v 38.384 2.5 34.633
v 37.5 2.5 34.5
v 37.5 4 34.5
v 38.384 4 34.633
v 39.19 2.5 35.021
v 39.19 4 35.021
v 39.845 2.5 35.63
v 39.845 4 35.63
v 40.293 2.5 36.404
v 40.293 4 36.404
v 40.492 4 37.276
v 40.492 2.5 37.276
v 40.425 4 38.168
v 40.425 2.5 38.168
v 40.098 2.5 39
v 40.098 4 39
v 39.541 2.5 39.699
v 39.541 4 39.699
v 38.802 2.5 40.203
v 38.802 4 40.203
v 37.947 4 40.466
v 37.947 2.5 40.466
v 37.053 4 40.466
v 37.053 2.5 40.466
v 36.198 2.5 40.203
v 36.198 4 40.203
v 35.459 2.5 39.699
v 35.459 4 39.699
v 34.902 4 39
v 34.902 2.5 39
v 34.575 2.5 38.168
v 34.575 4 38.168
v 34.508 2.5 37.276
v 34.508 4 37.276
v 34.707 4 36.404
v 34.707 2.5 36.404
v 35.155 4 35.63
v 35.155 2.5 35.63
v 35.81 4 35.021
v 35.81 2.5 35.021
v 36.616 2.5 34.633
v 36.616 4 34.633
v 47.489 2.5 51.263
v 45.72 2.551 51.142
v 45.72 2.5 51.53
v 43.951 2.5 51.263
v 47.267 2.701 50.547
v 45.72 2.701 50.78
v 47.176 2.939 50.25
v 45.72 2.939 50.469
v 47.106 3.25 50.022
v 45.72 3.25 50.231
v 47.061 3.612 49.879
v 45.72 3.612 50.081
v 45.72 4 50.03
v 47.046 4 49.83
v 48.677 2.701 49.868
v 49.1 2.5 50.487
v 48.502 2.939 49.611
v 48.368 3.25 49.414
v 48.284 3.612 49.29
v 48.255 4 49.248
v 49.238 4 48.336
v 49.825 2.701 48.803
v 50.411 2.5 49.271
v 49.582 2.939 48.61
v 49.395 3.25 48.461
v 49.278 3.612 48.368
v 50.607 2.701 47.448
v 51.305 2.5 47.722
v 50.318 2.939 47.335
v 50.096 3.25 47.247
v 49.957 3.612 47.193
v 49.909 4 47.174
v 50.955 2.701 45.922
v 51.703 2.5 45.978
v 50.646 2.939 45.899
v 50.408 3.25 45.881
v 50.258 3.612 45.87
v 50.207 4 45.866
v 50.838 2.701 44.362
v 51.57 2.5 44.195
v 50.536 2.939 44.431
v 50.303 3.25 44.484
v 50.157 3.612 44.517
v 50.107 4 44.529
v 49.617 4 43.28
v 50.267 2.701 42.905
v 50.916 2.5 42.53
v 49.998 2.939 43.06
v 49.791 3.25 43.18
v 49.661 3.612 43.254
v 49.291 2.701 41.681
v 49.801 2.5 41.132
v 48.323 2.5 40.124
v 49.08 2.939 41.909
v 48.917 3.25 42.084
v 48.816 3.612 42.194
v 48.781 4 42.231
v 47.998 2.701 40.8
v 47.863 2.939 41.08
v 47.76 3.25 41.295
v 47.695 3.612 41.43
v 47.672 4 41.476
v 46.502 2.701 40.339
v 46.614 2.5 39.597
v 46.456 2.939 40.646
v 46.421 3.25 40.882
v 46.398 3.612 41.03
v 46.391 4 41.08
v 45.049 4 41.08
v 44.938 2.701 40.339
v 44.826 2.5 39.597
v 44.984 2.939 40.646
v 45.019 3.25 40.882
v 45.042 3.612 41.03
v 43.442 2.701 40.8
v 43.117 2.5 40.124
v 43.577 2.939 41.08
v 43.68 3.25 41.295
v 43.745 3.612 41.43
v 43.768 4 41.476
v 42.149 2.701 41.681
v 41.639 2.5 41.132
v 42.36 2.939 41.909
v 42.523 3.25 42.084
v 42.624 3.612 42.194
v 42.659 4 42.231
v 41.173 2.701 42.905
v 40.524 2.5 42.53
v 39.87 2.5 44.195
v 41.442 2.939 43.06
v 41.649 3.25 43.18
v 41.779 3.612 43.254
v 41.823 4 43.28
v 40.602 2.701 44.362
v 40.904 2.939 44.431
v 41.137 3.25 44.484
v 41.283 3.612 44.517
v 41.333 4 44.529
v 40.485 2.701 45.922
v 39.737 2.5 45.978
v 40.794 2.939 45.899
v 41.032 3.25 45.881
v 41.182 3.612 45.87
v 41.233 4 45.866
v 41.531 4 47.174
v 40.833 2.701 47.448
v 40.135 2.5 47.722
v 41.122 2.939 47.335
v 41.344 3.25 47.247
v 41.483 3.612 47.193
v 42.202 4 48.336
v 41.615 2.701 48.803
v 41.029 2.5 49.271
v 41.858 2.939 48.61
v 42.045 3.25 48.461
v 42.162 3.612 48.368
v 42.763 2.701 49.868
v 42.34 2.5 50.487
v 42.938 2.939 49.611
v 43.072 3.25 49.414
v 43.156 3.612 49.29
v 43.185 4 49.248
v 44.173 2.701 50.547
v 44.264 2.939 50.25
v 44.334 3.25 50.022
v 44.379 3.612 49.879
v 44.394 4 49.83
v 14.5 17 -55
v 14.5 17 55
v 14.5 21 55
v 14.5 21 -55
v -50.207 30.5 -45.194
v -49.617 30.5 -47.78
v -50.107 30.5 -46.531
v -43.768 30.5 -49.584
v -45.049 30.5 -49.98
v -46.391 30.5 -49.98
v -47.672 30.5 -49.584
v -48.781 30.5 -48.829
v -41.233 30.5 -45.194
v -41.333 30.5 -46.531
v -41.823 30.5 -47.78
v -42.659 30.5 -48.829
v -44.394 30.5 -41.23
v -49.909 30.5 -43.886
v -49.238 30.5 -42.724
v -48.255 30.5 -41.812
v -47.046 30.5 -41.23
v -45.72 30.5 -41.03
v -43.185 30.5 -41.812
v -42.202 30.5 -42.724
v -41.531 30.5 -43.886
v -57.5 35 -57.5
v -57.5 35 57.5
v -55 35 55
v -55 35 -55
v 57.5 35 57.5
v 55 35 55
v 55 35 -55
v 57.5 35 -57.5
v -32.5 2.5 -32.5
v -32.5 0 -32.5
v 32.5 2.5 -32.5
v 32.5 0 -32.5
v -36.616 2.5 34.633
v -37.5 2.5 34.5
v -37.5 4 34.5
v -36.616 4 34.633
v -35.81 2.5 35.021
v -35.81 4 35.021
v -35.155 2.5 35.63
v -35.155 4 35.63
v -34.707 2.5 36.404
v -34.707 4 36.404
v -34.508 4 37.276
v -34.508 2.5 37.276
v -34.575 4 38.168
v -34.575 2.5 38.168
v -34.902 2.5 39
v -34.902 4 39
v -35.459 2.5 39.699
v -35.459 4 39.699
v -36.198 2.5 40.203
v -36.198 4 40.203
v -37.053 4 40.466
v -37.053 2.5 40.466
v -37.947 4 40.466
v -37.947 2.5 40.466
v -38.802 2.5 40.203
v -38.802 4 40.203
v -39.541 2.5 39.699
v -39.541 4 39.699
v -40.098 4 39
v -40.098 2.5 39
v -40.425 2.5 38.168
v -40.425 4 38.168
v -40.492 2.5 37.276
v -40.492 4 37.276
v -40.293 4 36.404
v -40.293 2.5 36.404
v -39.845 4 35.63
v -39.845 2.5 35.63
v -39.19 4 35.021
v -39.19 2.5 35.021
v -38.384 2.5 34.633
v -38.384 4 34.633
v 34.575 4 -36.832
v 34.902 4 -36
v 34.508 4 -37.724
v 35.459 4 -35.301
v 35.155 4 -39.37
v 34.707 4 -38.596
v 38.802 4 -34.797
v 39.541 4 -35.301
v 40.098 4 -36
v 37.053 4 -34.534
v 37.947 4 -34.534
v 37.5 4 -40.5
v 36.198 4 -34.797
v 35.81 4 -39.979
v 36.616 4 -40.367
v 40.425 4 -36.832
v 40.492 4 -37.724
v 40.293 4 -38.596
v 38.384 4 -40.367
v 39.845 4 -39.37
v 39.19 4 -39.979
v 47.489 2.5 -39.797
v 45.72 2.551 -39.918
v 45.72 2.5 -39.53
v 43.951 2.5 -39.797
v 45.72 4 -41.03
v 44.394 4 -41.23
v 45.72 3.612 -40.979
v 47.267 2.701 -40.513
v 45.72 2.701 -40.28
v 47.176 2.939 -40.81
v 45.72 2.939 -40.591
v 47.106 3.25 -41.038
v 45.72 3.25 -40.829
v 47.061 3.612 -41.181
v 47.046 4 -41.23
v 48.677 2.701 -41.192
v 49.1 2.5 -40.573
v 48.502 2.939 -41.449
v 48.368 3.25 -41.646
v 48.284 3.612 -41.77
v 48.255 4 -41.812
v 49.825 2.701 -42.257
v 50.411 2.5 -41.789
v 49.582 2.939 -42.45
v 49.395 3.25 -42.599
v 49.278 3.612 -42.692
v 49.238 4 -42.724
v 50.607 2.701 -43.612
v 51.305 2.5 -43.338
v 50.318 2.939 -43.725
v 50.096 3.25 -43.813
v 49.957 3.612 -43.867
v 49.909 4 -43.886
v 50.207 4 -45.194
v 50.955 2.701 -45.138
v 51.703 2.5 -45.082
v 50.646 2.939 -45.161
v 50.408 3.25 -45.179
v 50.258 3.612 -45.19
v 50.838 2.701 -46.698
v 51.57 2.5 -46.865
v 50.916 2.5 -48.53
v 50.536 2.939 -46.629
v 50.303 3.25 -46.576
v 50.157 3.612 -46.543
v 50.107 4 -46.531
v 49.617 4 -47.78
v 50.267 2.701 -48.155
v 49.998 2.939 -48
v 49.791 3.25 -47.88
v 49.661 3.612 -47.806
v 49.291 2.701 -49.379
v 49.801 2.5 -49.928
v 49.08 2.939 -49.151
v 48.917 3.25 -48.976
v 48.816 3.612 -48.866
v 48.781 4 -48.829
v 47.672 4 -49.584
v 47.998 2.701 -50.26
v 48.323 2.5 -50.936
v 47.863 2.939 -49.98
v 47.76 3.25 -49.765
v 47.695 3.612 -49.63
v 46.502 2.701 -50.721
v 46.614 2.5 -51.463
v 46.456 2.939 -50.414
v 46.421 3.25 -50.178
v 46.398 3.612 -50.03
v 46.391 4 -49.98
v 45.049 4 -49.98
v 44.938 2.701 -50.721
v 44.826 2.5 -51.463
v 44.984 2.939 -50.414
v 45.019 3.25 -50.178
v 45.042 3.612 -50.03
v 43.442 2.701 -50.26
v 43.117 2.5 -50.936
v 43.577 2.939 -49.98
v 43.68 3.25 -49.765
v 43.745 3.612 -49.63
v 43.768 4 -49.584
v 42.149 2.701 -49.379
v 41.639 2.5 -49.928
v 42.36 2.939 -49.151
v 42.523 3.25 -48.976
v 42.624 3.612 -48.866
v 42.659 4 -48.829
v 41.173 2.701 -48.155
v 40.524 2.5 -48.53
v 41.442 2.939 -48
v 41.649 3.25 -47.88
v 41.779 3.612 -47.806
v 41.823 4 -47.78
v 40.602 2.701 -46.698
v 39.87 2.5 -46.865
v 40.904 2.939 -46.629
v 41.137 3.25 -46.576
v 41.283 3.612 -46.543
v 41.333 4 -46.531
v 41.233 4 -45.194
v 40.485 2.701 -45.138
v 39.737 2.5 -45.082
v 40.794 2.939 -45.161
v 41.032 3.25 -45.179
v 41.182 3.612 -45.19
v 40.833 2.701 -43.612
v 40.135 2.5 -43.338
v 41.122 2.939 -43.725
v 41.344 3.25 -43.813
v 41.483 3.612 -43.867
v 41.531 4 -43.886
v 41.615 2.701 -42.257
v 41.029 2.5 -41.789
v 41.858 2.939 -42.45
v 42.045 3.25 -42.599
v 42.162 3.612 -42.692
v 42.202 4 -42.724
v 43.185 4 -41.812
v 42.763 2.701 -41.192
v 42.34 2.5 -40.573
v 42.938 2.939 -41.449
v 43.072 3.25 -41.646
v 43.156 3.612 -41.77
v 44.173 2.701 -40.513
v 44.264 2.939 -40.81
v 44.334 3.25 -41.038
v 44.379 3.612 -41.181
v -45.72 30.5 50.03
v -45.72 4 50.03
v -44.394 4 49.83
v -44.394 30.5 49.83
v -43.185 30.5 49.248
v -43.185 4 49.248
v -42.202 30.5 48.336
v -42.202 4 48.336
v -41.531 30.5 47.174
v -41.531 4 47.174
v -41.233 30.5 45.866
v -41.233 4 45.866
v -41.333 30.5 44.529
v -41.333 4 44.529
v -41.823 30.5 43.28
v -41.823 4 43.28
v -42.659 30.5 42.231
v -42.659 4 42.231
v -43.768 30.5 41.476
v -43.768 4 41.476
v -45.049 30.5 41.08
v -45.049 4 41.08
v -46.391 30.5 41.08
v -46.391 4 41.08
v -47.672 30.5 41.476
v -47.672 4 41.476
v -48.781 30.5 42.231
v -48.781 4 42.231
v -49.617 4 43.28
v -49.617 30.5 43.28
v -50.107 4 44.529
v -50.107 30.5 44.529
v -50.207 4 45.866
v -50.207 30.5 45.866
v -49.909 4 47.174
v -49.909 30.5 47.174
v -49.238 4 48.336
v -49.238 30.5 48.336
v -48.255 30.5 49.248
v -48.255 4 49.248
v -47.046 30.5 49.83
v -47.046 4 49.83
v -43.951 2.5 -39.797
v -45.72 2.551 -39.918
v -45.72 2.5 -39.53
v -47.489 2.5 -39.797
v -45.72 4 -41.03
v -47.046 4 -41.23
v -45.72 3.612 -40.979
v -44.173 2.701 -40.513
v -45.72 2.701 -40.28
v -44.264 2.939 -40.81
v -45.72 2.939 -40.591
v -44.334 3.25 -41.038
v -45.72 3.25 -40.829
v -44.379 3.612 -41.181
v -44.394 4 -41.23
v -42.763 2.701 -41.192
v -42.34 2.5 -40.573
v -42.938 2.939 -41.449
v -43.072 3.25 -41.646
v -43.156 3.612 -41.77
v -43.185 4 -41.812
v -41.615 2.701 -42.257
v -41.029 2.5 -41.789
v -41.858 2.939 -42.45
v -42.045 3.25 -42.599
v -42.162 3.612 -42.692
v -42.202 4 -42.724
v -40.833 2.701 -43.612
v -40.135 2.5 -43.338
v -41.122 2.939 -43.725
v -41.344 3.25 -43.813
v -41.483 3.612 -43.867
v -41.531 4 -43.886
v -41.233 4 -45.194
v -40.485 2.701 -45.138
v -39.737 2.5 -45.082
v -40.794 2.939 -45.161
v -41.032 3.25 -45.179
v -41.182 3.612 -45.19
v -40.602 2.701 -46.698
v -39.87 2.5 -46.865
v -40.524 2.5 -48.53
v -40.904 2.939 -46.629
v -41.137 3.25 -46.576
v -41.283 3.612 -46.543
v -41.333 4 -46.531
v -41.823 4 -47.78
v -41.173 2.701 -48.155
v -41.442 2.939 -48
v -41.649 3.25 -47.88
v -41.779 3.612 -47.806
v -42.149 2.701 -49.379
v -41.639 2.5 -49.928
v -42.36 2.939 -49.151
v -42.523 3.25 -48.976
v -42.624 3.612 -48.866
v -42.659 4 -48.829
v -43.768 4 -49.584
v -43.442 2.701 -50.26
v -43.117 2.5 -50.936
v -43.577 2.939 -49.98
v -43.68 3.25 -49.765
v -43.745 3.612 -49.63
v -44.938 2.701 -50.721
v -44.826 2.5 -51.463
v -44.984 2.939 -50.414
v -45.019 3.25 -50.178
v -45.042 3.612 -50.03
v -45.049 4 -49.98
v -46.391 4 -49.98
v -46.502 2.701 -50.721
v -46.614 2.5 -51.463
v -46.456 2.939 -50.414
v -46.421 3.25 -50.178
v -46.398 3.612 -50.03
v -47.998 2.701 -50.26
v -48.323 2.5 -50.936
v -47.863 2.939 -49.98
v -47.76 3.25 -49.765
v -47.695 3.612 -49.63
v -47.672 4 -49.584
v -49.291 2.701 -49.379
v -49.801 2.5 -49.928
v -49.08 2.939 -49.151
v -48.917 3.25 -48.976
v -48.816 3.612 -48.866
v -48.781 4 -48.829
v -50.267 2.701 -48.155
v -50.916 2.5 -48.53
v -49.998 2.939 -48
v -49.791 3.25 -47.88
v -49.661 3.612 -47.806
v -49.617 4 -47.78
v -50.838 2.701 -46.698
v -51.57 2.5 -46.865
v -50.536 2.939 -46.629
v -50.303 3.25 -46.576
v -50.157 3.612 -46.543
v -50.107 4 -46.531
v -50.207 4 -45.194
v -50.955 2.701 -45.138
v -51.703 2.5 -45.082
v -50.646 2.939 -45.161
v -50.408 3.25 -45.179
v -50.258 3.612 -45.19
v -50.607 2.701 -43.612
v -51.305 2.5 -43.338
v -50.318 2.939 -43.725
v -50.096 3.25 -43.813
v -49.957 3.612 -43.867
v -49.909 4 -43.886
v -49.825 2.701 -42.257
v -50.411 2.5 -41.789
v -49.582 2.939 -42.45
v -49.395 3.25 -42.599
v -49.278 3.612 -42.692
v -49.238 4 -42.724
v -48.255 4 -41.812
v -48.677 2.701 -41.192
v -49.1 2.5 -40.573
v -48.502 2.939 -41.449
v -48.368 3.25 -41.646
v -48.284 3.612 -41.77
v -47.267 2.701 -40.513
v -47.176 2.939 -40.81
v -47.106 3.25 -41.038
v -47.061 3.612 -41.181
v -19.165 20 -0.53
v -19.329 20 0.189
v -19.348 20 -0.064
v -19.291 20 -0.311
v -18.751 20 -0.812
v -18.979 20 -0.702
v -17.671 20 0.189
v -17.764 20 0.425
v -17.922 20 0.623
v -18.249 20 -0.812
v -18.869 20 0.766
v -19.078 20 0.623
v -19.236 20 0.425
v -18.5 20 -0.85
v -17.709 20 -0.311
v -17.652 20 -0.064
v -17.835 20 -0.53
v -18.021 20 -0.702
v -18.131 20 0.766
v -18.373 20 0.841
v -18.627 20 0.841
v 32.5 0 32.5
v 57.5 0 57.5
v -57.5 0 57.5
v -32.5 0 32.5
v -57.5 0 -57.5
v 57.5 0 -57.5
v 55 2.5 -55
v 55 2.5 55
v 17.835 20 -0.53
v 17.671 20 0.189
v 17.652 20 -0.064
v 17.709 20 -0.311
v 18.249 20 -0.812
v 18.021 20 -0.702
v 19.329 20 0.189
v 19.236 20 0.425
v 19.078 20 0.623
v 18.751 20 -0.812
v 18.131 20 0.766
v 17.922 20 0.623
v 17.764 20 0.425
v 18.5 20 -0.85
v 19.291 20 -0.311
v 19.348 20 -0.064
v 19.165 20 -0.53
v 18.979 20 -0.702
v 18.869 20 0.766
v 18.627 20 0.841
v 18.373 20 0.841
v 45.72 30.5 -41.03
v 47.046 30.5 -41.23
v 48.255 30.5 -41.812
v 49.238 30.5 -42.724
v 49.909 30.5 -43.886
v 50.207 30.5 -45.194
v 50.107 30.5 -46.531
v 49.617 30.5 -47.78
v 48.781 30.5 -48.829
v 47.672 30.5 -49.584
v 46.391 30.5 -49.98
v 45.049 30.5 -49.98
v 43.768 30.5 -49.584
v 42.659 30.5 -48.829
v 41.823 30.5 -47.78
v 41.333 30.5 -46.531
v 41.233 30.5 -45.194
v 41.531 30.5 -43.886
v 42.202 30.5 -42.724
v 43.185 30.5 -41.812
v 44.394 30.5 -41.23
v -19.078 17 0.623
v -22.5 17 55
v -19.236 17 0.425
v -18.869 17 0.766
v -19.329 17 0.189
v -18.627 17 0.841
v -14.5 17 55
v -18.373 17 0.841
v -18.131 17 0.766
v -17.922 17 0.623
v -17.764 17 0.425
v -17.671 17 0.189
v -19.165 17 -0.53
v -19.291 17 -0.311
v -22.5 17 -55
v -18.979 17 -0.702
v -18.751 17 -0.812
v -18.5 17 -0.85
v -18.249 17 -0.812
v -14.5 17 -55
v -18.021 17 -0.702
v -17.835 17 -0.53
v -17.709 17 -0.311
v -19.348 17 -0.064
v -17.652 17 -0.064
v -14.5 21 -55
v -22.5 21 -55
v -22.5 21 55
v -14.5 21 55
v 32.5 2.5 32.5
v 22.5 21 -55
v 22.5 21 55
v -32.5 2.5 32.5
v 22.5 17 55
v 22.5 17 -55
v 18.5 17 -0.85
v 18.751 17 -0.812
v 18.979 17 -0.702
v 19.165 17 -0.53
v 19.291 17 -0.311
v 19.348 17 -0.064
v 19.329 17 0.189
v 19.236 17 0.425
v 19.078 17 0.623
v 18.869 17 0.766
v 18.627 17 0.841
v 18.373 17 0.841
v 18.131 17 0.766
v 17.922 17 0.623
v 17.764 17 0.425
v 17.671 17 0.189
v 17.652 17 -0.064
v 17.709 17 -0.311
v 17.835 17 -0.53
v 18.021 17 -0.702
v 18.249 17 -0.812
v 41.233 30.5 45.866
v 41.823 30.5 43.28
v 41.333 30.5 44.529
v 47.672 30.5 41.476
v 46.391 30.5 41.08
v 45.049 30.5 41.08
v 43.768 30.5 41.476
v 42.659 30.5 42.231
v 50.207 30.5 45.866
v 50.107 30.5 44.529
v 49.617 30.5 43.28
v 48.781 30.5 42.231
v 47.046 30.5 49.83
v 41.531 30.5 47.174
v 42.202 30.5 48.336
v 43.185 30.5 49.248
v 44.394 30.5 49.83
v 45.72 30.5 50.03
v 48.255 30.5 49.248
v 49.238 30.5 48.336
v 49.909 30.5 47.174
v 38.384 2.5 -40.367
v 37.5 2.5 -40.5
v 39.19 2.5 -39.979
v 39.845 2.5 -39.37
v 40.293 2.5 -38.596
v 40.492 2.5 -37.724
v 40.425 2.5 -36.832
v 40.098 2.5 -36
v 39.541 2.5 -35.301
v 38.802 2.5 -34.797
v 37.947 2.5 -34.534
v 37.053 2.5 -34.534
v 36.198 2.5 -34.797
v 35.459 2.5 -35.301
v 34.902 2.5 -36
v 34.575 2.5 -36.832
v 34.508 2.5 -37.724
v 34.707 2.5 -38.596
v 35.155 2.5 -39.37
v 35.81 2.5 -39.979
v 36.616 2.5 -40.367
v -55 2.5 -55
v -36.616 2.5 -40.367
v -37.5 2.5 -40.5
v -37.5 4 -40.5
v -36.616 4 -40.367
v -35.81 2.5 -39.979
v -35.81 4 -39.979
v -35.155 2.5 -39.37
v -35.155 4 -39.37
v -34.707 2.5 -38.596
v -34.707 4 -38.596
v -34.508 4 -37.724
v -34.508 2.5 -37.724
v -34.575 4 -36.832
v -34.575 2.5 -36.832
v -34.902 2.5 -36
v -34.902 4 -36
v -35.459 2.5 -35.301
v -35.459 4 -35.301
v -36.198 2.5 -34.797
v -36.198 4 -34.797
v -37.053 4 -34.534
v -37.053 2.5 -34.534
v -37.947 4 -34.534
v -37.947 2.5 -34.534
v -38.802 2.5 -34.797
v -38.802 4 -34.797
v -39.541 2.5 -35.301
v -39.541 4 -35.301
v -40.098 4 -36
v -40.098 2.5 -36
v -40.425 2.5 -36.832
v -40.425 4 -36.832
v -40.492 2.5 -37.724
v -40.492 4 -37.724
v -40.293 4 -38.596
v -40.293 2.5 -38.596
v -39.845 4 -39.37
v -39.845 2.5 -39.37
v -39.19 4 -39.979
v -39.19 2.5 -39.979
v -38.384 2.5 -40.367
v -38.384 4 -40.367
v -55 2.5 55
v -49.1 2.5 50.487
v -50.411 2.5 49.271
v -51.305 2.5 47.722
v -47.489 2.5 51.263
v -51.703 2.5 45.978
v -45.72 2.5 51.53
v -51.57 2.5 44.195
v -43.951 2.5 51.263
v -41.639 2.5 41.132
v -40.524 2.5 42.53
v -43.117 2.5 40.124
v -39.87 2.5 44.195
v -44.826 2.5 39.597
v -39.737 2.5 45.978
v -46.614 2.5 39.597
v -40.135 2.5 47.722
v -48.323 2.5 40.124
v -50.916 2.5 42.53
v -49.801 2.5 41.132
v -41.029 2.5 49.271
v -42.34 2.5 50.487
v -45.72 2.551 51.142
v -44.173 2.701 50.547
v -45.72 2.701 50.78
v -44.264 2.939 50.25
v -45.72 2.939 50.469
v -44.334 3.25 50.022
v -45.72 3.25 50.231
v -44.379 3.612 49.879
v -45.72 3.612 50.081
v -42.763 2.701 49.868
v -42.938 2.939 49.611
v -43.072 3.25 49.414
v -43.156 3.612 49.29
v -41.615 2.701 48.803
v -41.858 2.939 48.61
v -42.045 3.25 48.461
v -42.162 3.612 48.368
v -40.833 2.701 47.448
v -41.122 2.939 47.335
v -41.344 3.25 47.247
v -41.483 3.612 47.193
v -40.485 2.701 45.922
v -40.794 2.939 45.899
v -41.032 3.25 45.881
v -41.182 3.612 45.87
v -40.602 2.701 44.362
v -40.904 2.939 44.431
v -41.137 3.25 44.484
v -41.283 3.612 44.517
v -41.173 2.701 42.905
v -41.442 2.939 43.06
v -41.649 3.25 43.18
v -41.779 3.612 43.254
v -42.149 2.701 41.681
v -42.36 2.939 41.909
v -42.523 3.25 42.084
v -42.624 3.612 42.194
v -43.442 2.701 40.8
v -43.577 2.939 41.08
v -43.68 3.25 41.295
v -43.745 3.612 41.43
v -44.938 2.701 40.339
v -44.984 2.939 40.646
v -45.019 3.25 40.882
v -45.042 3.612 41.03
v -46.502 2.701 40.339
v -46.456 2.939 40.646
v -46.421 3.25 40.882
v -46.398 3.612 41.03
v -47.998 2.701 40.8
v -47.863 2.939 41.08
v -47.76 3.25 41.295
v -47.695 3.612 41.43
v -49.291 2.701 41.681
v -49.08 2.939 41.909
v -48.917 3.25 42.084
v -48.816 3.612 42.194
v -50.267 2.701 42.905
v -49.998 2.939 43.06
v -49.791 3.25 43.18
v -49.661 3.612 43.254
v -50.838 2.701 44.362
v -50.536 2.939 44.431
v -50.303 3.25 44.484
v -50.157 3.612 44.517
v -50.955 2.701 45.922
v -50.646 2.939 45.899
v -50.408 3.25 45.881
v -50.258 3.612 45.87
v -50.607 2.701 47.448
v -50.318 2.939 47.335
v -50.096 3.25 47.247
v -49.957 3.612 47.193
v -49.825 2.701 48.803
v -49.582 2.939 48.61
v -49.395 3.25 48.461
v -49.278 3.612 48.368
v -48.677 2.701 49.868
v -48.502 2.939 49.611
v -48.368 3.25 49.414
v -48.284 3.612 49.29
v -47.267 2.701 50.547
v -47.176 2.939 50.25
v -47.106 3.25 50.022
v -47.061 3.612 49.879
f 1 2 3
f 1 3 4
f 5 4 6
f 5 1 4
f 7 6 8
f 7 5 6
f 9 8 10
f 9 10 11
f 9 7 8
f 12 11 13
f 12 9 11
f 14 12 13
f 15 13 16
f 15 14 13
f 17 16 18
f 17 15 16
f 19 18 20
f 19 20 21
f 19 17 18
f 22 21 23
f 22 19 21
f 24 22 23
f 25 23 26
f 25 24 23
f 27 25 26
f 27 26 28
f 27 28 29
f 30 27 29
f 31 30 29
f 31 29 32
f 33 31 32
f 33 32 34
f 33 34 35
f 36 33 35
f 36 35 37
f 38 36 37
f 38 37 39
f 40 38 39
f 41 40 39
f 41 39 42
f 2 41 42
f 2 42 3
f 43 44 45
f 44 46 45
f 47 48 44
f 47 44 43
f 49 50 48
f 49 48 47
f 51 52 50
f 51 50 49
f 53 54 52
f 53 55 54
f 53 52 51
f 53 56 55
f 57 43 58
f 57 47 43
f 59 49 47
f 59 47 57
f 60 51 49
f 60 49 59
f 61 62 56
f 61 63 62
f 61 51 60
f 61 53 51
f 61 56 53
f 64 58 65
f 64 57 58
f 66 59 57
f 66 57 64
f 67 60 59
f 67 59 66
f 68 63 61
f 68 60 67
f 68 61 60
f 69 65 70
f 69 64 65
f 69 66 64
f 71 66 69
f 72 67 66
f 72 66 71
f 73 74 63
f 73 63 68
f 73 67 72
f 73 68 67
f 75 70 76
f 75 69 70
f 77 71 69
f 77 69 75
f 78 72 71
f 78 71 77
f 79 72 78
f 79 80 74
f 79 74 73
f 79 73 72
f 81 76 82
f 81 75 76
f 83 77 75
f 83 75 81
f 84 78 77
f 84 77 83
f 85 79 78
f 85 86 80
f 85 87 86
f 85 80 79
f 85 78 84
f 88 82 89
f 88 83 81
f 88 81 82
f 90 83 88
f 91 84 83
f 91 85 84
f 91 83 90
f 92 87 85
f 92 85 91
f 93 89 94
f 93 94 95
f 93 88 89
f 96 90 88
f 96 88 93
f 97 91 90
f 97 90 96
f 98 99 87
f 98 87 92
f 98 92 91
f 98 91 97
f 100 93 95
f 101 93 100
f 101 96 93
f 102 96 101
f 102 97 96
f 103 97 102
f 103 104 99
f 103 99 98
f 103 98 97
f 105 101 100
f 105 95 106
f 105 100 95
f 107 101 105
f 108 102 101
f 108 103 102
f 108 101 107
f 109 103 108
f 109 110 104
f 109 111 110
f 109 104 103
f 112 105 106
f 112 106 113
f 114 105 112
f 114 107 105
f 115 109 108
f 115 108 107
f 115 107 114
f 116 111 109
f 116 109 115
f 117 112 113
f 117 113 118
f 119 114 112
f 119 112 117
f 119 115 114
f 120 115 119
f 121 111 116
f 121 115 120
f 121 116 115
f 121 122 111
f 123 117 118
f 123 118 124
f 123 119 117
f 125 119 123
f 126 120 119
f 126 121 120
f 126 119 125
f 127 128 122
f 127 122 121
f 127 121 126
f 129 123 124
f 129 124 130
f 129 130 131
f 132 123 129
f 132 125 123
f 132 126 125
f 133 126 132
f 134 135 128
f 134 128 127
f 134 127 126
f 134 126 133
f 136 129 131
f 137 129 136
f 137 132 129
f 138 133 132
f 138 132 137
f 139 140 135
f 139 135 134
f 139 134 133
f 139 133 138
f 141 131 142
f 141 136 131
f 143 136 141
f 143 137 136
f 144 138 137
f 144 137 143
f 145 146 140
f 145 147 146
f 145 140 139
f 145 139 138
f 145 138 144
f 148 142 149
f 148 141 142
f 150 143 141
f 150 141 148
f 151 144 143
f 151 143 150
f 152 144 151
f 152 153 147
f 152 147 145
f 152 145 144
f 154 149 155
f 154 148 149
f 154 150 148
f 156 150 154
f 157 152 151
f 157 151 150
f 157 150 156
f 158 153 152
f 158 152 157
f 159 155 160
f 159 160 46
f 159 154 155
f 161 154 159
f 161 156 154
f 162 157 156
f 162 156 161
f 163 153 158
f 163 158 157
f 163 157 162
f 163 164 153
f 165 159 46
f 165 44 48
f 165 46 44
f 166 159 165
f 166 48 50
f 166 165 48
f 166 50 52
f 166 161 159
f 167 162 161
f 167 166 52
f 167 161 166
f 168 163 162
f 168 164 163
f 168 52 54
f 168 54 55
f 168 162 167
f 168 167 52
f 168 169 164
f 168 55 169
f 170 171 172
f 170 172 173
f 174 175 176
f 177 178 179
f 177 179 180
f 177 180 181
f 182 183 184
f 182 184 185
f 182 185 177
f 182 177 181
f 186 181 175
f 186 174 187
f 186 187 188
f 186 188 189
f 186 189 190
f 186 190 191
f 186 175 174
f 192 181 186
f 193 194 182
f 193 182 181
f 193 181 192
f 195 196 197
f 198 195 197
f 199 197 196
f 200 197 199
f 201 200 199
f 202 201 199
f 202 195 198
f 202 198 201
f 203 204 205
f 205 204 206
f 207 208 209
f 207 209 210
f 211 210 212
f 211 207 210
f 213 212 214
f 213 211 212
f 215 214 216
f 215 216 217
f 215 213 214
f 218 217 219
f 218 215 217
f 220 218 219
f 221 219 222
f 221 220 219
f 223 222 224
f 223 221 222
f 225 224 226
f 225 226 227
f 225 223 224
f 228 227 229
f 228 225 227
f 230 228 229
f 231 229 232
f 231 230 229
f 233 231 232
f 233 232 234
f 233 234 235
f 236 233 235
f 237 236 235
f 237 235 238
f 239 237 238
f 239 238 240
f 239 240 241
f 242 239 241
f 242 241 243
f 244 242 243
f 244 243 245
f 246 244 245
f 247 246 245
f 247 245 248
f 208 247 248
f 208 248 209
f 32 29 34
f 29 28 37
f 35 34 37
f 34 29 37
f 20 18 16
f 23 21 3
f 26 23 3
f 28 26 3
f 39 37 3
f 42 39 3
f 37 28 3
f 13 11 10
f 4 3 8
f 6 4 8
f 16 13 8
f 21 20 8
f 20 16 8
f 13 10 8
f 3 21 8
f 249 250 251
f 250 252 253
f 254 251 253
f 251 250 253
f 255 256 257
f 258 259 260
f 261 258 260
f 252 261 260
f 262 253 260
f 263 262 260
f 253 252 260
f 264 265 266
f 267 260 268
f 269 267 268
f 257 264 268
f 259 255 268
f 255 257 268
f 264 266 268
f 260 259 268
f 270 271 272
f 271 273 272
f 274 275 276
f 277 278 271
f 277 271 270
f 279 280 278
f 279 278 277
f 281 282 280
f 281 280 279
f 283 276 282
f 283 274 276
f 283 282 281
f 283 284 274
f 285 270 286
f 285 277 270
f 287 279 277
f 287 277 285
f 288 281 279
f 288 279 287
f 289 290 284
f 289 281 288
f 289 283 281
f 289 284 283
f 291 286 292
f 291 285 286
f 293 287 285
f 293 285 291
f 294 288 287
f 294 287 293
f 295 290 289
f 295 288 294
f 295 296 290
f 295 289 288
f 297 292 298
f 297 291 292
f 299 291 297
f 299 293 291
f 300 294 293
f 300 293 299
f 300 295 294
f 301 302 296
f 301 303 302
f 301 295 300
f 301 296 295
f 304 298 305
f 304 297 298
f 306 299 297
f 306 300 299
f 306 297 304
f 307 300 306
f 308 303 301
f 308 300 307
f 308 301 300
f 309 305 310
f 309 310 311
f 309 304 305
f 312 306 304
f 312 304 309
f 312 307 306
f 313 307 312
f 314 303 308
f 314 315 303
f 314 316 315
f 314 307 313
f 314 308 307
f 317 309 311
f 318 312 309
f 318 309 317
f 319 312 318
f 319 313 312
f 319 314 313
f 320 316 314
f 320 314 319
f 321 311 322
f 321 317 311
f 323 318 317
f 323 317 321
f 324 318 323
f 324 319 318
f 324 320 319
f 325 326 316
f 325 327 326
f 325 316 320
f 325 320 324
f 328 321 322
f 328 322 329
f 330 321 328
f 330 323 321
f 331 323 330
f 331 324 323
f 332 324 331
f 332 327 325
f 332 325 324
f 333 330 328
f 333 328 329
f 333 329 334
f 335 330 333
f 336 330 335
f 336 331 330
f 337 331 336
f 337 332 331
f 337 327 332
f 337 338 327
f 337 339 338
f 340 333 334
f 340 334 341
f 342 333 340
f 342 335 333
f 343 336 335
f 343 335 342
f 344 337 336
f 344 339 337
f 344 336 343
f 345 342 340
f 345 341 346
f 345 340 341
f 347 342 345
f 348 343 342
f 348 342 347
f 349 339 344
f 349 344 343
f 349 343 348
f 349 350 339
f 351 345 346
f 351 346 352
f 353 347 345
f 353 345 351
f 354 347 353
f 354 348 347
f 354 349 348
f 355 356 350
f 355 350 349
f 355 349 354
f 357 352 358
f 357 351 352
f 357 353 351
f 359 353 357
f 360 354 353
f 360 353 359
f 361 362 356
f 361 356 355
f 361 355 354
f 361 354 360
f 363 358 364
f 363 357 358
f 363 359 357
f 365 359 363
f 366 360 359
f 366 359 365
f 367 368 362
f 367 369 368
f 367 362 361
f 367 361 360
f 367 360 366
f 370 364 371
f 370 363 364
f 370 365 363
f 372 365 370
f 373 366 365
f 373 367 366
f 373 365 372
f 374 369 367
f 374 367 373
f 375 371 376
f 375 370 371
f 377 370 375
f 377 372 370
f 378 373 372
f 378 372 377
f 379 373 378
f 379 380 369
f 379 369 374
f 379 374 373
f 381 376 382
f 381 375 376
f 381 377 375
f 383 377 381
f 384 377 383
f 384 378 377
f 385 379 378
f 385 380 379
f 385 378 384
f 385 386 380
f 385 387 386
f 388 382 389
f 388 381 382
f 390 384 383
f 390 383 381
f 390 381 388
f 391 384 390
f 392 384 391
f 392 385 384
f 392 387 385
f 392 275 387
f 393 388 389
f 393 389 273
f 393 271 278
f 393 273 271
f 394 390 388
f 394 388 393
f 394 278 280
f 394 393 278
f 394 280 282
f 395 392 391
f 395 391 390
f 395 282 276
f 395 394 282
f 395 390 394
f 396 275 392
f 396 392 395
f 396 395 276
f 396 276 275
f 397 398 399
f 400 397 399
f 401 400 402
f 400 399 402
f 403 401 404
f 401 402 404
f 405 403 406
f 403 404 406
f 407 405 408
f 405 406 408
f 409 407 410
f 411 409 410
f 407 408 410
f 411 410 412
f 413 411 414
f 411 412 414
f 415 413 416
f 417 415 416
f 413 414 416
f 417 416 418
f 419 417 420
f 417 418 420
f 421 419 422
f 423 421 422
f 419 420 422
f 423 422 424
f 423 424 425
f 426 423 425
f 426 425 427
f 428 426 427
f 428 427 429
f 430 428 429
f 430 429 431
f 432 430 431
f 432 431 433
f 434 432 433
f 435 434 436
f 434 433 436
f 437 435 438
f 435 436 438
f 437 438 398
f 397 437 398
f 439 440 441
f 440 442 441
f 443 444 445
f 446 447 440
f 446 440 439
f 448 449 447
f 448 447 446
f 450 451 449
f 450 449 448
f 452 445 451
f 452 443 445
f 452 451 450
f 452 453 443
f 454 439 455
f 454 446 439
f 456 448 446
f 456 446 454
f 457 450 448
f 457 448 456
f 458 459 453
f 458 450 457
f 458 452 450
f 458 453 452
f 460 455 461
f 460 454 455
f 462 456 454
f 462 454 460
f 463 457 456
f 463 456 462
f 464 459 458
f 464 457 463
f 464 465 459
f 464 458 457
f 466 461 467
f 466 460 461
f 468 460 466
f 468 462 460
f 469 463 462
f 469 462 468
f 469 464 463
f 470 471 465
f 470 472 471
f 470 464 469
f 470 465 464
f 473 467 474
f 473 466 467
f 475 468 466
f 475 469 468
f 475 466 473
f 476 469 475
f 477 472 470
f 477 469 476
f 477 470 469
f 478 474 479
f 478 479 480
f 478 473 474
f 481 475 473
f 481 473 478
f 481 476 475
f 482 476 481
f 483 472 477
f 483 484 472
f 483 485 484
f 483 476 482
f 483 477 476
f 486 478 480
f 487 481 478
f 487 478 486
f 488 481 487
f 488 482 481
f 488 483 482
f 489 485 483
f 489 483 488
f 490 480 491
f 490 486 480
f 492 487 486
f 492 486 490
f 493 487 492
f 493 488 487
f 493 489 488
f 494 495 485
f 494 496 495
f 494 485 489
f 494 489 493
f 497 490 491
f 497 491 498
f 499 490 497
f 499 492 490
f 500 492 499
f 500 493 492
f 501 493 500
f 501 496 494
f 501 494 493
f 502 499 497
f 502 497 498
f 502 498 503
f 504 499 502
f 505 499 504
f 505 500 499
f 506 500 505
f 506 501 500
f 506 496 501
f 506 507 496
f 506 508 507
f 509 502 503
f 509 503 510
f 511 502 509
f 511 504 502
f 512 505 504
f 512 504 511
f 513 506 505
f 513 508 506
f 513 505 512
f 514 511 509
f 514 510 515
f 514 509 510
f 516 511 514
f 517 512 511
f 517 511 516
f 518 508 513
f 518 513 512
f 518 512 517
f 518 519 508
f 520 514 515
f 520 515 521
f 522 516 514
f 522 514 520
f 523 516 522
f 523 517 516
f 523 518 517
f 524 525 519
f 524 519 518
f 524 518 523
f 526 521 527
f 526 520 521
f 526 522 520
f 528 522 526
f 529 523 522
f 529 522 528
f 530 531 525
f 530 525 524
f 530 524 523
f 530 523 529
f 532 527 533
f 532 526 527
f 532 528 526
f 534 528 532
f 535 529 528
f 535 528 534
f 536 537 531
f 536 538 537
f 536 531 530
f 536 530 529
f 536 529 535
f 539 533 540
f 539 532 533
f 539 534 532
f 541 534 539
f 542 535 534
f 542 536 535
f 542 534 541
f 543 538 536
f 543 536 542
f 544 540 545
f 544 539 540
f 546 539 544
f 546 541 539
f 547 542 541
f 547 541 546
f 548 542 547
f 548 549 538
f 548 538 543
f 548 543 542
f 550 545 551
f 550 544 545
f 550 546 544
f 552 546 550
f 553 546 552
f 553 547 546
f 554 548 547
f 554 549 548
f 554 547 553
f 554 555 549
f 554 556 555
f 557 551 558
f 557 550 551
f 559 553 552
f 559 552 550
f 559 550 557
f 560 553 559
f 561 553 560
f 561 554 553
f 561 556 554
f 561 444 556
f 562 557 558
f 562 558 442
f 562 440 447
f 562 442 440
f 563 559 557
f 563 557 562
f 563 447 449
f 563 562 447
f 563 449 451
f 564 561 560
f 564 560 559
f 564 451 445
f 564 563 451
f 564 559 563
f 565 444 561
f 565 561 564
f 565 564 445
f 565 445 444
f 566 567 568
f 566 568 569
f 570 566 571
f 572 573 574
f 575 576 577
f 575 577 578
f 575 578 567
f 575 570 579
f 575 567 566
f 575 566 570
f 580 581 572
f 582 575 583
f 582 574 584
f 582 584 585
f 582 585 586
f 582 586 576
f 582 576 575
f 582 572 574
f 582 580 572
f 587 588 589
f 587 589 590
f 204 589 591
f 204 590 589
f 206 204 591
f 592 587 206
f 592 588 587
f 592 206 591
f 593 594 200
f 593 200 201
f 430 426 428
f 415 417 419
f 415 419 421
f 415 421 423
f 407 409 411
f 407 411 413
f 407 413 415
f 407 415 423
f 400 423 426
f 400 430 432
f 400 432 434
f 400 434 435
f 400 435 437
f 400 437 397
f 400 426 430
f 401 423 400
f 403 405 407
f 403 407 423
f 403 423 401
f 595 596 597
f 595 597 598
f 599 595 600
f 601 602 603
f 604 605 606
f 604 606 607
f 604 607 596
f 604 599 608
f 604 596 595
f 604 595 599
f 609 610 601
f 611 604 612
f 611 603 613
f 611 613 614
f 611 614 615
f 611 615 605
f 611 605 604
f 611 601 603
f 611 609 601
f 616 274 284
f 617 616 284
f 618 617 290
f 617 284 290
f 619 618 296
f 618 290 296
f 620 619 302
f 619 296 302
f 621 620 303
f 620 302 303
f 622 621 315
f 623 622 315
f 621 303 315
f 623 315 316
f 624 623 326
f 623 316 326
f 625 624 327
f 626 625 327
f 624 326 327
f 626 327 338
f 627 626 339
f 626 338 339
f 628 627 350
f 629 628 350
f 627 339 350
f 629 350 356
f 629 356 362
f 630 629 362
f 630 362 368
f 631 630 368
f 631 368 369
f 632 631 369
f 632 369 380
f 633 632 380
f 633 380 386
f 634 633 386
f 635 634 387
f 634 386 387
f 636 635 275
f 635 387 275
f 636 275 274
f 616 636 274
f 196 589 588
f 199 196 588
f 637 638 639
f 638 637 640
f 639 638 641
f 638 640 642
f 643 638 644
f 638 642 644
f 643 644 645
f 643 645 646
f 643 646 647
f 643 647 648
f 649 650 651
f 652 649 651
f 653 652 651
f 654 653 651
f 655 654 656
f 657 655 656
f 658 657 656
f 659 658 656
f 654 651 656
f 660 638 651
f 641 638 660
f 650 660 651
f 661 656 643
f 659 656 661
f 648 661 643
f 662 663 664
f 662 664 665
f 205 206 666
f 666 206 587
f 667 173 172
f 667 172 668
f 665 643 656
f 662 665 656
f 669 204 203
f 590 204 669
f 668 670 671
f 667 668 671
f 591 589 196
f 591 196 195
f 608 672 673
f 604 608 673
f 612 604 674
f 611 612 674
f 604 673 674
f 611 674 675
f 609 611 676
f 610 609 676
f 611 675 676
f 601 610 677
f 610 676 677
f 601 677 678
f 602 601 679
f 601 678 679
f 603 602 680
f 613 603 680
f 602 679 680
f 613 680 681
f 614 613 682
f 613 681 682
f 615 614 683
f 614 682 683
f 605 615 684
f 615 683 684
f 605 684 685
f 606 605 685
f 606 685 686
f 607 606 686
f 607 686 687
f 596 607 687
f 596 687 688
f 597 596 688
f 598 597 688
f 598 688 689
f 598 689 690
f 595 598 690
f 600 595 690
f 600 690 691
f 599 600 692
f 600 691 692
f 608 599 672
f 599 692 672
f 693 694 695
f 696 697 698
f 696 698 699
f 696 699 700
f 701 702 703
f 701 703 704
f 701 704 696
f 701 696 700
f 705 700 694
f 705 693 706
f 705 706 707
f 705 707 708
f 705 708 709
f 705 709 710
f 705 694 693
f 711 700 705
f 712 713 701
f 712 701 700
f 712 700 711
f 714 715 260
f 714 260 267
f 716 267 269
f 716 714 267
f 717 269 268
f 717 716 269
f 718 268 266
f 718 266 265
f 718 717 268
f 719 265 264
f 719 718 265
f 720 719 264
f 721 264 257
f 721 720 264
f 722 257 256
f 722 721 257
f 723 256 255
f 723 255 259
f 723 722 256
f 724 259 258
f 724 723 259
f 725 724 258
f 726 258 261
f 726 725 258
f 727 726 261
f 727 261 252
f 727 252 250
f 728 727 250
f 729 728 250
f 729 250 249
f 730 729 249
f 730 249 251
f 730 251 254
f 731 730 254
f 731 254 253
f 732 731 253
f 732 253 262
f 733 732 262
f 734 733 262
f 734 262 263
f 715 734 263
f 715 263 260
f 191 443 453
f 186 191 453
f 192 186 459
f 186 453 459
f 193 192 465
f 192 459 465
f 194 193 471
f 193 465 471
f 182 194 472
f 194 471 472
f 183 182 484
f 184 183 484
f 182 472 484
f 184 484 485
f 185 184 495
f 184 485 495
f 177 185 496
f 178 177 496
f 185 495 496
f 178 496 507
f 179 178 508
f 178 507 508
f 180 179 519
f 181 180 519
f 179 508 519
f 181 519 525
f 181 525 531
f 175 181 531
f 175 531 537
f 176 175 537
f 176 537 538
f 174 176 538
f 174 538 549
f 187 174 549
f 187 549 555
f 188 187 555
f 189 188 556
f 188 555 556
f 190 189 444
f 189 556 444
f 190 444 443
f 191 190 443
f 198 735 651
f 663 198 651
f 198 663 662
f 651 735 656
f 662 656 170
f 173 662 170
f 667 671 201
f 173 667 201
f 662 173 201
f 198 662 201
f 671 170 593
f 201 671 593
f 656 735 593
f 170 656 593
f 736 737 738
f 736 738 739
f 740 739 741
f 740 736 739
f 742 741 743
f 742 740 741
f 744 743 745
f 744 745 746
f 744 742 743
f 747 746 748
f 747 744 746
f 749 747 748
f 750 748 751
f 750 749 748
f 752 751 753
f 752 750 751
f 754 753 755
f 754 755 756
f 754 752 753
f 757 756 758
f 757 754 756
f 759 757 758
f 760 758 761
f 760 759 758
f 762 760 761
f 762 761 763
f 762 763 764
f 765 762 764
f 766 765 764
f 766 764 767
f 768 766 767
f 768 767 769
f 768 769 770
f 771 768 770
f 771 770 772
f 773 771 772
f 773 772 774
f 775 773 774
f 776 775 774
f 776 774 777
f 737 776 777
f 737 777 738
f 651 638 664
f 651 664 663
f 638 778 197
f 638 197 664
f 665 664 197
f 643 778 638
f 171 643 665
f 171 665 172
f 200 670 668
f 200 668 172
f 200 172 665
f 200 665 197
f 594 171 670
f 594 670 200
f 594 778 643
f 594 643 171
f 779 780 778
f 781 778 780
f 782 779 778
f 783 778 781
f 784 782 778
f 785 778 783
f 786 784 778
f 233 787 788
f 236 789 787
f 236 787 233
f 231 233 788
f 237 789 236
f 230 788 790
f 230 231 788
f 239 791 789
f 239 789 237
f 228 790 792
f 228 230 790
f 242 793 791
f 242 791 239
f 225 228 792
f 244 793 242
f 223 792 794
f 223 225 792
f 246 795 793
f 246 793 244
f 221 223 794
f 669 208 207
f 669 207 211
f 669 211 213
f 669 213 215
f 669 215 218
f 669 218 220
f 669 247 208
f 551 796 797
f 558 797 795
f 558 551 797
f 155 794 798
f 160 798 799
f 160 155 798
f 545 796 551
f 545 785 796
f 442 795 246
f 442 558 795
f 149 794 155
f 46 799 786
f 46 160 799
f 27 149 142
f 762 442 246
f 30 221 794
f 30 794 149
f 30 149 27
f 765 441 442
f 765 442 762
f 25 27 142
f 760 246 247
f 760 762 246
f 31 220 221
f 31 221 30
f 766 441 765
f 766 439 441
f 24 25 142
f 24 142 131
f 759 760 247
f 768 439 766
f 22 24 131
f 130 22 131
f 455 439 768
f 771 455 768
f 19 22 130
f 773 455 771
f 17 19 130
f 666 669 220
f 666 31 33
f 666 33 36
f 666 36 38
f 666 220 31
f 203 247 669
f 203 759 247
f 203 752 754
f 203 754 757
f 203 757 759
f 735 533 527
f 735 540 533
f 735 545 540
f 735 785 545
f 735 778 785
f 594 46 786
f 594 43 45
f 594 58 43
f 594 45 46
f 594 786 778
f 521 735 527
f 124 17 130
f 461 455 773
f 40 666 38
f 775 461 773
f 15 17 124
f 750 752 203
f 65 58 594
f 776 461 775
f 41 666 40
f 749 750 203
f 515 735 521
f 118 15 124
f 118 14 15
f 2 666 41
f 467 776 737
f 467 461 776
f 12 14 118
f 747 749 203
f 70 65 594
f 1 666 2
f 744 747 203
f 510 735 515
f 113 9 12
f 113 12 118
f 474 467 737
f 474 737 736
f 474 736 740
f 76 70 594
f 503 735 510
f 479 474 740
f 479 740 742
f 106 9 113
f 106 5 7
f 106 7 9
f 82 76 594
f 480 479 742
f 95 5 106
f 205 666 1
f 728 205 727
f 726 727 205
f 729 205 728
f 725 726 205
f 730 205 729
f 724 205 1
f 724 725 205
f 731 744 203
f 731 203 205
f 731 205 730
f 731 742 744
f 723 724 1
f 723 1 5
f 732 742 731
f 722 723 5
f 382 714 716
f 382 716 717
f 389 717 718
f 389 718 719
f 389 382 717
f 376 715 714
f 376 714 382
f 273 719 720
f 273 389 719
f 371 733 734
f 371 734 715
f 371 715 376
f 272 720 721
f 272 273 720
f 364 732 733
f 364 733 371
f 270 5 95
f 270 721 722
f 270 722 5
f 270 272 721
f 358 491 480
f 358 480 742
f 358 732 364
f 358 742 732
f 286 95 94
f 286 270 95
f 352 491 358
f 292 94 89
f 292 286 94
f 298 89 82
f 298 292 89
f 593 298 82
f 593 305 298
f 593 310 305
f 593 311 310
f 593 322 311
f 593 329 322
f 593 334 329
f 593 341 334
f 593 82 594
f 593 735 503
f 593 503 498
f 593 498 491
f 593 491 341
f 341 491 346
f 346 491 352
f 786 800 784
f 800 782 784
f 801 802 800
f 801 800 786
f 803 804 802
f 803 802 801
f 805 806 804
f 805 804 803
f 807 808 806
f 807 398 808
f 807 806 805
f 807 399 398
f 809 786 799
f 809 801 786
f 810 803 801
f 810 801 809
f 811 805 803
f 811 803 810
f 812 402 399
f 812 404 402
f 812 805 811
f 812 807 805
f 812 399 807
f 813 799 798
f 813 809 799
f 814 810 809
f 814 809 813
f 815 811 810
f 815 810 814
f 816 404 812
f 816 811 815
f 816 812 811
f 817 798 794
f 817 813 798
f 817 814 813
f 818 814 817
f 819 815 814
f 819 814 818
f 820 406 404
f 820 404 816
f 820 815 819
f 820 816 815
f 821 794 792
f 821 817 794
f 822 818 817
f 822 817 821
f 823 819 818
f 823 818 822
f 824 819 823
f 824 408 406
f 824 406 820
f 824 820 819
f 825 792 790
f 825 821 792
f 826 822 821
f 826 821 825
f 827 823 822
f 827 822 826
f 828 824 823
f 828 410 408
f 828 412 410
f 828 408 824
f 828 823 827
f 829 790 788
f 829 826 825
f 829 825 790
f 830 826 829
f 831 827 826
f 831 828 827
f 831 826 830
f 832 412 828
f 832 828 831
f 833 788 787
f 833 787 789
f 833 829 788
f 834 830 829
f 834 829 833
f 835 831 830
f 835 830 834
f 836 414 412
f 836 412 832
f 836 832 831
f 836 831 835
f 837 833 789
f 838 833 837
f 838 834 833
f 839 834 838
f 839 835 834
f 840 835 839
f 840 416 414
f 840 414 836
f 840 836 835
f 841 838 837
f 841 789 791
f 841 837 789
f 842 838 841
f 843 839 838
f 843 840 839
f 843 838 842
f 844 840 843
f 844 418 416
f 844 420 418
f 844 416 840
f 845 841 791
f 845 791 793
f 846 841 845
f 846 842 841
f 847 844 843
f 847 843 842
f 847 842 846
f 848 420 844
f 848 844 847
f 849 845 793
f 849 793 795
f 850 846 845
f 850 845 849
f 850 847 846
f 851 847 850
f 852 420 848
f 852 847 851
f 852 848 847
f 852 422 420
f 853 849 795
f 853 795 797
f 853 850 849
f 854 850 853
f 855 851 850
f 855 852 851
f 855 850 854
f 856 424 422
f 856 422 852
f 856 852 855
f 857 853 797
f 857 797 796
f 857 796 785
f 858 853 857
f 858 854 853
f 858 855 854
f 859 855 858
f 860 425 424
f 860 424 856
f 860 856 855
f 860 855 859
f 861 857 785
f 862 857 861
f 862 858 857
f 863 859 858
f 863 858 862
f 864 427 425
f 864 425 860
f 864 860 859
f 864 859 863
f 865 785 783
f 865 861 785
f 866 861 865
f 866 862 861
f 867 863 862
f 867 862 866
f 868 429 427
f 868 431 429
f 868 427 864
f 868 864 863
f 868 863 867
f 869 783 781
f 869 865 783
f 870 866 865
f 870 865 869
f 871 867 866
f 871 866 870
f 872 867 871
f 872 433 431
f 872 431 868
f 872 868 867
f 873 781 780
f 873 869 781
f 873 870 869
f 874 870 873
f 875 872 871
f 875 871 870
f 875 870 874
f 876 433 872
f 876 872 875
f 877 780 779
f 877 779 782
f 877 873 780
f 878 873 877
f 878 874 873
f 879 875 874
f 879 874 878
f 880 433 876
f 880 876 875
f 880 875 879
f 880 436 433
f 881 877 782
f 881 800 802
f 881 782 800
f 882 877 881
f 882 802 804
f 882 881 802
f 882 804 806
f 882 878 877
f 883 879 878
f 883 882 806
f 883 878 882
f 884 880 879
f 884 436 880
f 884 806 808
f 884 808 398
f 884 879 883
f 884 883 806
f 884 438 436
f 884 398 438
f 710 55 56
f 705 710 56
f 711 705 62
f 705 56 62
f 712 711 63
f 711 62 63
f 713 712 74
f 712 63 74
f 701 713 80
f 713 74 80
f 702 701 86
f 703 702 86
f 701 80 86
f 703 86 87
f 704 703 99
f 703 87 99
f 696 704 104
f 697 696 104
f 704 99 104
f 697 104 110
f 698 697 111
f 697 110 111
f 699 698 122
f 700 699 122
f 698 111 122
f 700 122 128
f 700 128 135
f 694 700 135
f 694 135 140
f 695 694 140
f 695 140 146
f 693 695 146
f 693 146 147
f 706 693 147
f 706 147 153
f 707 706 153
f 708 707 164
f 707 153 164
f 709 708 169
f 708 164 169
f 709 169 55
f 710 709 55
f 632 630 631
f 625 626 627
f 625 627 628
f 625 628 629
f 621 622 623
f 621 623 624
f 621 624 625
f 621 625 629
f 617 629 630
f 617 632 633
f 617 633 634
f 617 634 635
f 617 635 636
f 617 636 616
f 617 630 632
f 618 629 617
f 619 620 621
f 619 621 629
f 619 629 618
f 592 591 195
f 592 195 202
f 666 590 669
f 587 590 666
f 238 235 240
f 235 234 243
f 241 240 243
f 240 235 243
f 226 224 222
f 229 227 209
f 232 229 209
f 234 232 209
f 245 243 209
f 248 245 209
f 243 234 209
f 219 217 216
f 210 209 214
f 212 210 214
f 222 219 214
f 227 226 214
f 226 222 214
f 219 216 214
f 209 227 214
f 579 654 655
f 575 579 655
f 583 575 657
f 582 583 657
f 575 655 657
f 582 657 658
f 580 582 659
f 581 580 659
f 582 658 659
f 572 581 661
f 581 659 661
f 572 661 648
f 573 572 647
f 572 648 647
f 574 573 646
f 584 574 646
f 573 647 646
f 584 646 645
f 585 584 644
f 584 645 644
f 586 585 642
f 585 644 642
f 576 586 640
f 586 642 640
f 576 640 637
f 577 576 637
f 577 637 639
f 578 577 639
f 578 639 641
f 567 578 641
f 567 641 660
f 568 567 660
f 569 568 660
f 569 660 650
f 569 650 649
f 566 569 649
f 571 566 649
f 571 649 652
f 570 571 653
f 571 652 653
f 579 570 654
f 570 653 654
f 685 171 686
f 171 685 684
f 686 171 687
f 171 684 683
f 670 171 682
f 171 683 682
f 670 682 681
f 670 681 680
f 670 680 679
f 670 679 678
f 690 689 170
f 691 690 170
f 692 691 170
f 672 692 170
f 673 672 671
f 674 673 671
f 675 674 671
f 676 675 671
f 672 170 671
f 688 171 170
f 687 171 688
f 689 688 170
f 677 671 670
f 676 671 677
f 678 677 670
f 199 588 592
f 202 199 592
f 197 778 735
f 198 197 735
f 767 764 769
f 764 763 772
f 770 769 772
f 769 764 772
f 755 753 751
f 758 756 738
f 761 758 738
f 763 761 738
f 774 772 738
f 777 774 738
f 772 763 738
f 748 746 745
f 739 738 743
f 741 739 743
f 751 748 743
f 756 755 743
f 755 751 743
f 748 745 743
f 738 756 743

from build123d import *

# Parameters (mm, degrees)
SKETCH2_W           = 115
SKETCH2_H           = 115
BOSS_EXTRUDE1_DEPTH = 35
SHELL1_T            = -2.5
SKETCH3_R           = 4.5
BOSS_EXTRUDE4_DEPTH = 28
FILLET1_R           = 1.5
FILLET2_R           = 1.5
FILLET3_R           = 1.5
FILLET4_R           = 1.5
SKETCH4_W           = 65
SKETCH4_H           = 65
CUT_EXTRUDE1_DEPTH  = 89.529656048
SKETCH5_W           = 8
SKETCH5_H           = 112
BOSS_EXTRUDE5_DEPTH = 4
SKETCH7_R           = 0.85
CUT_EXTRUDE10_DEPTH = 3
SKETCH15_R          = 3
BOSS_EXTRUDE6_DEPTH = 4


with BuildPart() as part:
    # Sketch2 → Boss-Extrude1 (new body)
    with BuildSketch(Plane(origin=(0, 0, 0), x_dir=(1, 0, 0), z_dir=(0, 1, 0))):
        Rectangle(SKETCH2_W, SKETCH2_H)
    extrude(amount=BOSS_EXTRUDE1_DEPTH)

    # Shell1
    shell1_openings = [part.faces().sort_by_distance(p)[0] for p in [
        (0, 35, 0),
    ]]
    offset(amount=SHELL1_T, openings=shell1_openings, kind=Kind.INTERSECTION)

    # Sketch3 → Boss-Extrude4 (add)
    with BuildSketch(Plane(origin=(0, 2.5, 0), x_dir=(1, 0, 0), z_dir=(0, 1, 0))):
        with Locations(Location((-45.72, -45.53, 0), (0, 0, 270))):
            Circle(SKETCH3_R)
        with Locations(Location((-45.72, 45.53, 0), (0, 0, 270))):
            Circle(SKETCH3_R)
        with Locations(Location((45.72, 45.53, 0), (0, 0, 270))):
            Circle(SKETCH3_R)
        with Locations(Location((45.72, -45.53, 0), (0, 0, 270))):
            Circle(SKETCH3_R)
    extrude(amount=BOSS_EXTRUDE4_DEPTH)

    # Fillet1
    fillet1_edges = [part.edges().sort_by_distance(p)[0] for p in [
        (-45.72, 2.5, 41.03),
    ]]
    fillet(fillet1_edges, radius=FILLET1_R)

    # Fillet2
    fillet2_edges = [part.edges().sort_by_distance(p)[0] for p in [
        (-45.72, 2.5, -50.03),
    ]]
    fillet(fillet2_edges, radius=FILLET2_R)

    # Fillet3
    fillet3_edges = [part.edges().sort_by_distance(p)[0] for p in [
        (45.72, 2.5, -50.03),
    ]]
    fillet(fillet3_edges, radius=FILLET3_R)

    # Fillet4
    fillet4_edges = [part.edges().sort_by_distance(p)[0] for p in [
        (45.72, 2.5, 41.03),
    ]]
    fillet(fillet4_edges, radius=FILLET4_R)

    # Sketch4 → Cut-Extrude1 (cut, through all)
    with BuildSketch(Plane.XZ):
        Rectangle(SKETCH4_W, SKETCH4_H)
    extrude(amount=-CUT_EXTRUDE1_DEPTH, mode=Mode.SUBTRACT)

    # Sketch5 → Boss-Extrude5 (add)
    with BuildSketch(Plane(origin=(0, 17, 0), x_dir=(1, 0, 0), z_dir=(0, 1, 0))):
        with Locations((-18.5, 0)):
            Rectangle(SKETCH5_W, SKETCH5_H)
        with Locations((18.5, -0.001)):
            Rectangle(SKETCH5_W, SKETCH5_H)
    extrude(amount=BOSS_EXTRUDE5_DEPTH)

    # Sketch7 → Cut-Extrude10 (cut)
    with BuildSketch(Plane.XZ.offset(-17)):
        with Locations(Location((-18.5, 0, 0), (0, 0, 270))):
            Circle(SKETCH7_R)
        with Locations(Location((18.5, 0, 0), (0, 0, 270))):
            Circle(SKETCH7_R)
    extrude(amount=-CUT_EXTRUDE10_DEPTH, mode=Mode.SUBTRACT)

    # Sketch15 → Boss-Extrude6 (add)
    with BuildSketch(Plane.XZ):
        with Locations(Location((37.5, -37.5, 0), (0, 0, 270))):
            Circle(SKETCH15_R)
        with Locations(Location((-37.5, -37.5, 0), (0, 0, 270))):
            Circle(SKETCH15_R)
        with Locations(Location((-37.5, 37.5, 0), (0, 0, 270))):
            Circle(SKETCH15_R)
        with Locations(Location((37.5, 37.5, 0), (0, 0, 270))):
            Circle(SKETCH15_R)
    extrude(amount=-BOSS_EXTRUDE6_DEPTH)


solid = part.part
